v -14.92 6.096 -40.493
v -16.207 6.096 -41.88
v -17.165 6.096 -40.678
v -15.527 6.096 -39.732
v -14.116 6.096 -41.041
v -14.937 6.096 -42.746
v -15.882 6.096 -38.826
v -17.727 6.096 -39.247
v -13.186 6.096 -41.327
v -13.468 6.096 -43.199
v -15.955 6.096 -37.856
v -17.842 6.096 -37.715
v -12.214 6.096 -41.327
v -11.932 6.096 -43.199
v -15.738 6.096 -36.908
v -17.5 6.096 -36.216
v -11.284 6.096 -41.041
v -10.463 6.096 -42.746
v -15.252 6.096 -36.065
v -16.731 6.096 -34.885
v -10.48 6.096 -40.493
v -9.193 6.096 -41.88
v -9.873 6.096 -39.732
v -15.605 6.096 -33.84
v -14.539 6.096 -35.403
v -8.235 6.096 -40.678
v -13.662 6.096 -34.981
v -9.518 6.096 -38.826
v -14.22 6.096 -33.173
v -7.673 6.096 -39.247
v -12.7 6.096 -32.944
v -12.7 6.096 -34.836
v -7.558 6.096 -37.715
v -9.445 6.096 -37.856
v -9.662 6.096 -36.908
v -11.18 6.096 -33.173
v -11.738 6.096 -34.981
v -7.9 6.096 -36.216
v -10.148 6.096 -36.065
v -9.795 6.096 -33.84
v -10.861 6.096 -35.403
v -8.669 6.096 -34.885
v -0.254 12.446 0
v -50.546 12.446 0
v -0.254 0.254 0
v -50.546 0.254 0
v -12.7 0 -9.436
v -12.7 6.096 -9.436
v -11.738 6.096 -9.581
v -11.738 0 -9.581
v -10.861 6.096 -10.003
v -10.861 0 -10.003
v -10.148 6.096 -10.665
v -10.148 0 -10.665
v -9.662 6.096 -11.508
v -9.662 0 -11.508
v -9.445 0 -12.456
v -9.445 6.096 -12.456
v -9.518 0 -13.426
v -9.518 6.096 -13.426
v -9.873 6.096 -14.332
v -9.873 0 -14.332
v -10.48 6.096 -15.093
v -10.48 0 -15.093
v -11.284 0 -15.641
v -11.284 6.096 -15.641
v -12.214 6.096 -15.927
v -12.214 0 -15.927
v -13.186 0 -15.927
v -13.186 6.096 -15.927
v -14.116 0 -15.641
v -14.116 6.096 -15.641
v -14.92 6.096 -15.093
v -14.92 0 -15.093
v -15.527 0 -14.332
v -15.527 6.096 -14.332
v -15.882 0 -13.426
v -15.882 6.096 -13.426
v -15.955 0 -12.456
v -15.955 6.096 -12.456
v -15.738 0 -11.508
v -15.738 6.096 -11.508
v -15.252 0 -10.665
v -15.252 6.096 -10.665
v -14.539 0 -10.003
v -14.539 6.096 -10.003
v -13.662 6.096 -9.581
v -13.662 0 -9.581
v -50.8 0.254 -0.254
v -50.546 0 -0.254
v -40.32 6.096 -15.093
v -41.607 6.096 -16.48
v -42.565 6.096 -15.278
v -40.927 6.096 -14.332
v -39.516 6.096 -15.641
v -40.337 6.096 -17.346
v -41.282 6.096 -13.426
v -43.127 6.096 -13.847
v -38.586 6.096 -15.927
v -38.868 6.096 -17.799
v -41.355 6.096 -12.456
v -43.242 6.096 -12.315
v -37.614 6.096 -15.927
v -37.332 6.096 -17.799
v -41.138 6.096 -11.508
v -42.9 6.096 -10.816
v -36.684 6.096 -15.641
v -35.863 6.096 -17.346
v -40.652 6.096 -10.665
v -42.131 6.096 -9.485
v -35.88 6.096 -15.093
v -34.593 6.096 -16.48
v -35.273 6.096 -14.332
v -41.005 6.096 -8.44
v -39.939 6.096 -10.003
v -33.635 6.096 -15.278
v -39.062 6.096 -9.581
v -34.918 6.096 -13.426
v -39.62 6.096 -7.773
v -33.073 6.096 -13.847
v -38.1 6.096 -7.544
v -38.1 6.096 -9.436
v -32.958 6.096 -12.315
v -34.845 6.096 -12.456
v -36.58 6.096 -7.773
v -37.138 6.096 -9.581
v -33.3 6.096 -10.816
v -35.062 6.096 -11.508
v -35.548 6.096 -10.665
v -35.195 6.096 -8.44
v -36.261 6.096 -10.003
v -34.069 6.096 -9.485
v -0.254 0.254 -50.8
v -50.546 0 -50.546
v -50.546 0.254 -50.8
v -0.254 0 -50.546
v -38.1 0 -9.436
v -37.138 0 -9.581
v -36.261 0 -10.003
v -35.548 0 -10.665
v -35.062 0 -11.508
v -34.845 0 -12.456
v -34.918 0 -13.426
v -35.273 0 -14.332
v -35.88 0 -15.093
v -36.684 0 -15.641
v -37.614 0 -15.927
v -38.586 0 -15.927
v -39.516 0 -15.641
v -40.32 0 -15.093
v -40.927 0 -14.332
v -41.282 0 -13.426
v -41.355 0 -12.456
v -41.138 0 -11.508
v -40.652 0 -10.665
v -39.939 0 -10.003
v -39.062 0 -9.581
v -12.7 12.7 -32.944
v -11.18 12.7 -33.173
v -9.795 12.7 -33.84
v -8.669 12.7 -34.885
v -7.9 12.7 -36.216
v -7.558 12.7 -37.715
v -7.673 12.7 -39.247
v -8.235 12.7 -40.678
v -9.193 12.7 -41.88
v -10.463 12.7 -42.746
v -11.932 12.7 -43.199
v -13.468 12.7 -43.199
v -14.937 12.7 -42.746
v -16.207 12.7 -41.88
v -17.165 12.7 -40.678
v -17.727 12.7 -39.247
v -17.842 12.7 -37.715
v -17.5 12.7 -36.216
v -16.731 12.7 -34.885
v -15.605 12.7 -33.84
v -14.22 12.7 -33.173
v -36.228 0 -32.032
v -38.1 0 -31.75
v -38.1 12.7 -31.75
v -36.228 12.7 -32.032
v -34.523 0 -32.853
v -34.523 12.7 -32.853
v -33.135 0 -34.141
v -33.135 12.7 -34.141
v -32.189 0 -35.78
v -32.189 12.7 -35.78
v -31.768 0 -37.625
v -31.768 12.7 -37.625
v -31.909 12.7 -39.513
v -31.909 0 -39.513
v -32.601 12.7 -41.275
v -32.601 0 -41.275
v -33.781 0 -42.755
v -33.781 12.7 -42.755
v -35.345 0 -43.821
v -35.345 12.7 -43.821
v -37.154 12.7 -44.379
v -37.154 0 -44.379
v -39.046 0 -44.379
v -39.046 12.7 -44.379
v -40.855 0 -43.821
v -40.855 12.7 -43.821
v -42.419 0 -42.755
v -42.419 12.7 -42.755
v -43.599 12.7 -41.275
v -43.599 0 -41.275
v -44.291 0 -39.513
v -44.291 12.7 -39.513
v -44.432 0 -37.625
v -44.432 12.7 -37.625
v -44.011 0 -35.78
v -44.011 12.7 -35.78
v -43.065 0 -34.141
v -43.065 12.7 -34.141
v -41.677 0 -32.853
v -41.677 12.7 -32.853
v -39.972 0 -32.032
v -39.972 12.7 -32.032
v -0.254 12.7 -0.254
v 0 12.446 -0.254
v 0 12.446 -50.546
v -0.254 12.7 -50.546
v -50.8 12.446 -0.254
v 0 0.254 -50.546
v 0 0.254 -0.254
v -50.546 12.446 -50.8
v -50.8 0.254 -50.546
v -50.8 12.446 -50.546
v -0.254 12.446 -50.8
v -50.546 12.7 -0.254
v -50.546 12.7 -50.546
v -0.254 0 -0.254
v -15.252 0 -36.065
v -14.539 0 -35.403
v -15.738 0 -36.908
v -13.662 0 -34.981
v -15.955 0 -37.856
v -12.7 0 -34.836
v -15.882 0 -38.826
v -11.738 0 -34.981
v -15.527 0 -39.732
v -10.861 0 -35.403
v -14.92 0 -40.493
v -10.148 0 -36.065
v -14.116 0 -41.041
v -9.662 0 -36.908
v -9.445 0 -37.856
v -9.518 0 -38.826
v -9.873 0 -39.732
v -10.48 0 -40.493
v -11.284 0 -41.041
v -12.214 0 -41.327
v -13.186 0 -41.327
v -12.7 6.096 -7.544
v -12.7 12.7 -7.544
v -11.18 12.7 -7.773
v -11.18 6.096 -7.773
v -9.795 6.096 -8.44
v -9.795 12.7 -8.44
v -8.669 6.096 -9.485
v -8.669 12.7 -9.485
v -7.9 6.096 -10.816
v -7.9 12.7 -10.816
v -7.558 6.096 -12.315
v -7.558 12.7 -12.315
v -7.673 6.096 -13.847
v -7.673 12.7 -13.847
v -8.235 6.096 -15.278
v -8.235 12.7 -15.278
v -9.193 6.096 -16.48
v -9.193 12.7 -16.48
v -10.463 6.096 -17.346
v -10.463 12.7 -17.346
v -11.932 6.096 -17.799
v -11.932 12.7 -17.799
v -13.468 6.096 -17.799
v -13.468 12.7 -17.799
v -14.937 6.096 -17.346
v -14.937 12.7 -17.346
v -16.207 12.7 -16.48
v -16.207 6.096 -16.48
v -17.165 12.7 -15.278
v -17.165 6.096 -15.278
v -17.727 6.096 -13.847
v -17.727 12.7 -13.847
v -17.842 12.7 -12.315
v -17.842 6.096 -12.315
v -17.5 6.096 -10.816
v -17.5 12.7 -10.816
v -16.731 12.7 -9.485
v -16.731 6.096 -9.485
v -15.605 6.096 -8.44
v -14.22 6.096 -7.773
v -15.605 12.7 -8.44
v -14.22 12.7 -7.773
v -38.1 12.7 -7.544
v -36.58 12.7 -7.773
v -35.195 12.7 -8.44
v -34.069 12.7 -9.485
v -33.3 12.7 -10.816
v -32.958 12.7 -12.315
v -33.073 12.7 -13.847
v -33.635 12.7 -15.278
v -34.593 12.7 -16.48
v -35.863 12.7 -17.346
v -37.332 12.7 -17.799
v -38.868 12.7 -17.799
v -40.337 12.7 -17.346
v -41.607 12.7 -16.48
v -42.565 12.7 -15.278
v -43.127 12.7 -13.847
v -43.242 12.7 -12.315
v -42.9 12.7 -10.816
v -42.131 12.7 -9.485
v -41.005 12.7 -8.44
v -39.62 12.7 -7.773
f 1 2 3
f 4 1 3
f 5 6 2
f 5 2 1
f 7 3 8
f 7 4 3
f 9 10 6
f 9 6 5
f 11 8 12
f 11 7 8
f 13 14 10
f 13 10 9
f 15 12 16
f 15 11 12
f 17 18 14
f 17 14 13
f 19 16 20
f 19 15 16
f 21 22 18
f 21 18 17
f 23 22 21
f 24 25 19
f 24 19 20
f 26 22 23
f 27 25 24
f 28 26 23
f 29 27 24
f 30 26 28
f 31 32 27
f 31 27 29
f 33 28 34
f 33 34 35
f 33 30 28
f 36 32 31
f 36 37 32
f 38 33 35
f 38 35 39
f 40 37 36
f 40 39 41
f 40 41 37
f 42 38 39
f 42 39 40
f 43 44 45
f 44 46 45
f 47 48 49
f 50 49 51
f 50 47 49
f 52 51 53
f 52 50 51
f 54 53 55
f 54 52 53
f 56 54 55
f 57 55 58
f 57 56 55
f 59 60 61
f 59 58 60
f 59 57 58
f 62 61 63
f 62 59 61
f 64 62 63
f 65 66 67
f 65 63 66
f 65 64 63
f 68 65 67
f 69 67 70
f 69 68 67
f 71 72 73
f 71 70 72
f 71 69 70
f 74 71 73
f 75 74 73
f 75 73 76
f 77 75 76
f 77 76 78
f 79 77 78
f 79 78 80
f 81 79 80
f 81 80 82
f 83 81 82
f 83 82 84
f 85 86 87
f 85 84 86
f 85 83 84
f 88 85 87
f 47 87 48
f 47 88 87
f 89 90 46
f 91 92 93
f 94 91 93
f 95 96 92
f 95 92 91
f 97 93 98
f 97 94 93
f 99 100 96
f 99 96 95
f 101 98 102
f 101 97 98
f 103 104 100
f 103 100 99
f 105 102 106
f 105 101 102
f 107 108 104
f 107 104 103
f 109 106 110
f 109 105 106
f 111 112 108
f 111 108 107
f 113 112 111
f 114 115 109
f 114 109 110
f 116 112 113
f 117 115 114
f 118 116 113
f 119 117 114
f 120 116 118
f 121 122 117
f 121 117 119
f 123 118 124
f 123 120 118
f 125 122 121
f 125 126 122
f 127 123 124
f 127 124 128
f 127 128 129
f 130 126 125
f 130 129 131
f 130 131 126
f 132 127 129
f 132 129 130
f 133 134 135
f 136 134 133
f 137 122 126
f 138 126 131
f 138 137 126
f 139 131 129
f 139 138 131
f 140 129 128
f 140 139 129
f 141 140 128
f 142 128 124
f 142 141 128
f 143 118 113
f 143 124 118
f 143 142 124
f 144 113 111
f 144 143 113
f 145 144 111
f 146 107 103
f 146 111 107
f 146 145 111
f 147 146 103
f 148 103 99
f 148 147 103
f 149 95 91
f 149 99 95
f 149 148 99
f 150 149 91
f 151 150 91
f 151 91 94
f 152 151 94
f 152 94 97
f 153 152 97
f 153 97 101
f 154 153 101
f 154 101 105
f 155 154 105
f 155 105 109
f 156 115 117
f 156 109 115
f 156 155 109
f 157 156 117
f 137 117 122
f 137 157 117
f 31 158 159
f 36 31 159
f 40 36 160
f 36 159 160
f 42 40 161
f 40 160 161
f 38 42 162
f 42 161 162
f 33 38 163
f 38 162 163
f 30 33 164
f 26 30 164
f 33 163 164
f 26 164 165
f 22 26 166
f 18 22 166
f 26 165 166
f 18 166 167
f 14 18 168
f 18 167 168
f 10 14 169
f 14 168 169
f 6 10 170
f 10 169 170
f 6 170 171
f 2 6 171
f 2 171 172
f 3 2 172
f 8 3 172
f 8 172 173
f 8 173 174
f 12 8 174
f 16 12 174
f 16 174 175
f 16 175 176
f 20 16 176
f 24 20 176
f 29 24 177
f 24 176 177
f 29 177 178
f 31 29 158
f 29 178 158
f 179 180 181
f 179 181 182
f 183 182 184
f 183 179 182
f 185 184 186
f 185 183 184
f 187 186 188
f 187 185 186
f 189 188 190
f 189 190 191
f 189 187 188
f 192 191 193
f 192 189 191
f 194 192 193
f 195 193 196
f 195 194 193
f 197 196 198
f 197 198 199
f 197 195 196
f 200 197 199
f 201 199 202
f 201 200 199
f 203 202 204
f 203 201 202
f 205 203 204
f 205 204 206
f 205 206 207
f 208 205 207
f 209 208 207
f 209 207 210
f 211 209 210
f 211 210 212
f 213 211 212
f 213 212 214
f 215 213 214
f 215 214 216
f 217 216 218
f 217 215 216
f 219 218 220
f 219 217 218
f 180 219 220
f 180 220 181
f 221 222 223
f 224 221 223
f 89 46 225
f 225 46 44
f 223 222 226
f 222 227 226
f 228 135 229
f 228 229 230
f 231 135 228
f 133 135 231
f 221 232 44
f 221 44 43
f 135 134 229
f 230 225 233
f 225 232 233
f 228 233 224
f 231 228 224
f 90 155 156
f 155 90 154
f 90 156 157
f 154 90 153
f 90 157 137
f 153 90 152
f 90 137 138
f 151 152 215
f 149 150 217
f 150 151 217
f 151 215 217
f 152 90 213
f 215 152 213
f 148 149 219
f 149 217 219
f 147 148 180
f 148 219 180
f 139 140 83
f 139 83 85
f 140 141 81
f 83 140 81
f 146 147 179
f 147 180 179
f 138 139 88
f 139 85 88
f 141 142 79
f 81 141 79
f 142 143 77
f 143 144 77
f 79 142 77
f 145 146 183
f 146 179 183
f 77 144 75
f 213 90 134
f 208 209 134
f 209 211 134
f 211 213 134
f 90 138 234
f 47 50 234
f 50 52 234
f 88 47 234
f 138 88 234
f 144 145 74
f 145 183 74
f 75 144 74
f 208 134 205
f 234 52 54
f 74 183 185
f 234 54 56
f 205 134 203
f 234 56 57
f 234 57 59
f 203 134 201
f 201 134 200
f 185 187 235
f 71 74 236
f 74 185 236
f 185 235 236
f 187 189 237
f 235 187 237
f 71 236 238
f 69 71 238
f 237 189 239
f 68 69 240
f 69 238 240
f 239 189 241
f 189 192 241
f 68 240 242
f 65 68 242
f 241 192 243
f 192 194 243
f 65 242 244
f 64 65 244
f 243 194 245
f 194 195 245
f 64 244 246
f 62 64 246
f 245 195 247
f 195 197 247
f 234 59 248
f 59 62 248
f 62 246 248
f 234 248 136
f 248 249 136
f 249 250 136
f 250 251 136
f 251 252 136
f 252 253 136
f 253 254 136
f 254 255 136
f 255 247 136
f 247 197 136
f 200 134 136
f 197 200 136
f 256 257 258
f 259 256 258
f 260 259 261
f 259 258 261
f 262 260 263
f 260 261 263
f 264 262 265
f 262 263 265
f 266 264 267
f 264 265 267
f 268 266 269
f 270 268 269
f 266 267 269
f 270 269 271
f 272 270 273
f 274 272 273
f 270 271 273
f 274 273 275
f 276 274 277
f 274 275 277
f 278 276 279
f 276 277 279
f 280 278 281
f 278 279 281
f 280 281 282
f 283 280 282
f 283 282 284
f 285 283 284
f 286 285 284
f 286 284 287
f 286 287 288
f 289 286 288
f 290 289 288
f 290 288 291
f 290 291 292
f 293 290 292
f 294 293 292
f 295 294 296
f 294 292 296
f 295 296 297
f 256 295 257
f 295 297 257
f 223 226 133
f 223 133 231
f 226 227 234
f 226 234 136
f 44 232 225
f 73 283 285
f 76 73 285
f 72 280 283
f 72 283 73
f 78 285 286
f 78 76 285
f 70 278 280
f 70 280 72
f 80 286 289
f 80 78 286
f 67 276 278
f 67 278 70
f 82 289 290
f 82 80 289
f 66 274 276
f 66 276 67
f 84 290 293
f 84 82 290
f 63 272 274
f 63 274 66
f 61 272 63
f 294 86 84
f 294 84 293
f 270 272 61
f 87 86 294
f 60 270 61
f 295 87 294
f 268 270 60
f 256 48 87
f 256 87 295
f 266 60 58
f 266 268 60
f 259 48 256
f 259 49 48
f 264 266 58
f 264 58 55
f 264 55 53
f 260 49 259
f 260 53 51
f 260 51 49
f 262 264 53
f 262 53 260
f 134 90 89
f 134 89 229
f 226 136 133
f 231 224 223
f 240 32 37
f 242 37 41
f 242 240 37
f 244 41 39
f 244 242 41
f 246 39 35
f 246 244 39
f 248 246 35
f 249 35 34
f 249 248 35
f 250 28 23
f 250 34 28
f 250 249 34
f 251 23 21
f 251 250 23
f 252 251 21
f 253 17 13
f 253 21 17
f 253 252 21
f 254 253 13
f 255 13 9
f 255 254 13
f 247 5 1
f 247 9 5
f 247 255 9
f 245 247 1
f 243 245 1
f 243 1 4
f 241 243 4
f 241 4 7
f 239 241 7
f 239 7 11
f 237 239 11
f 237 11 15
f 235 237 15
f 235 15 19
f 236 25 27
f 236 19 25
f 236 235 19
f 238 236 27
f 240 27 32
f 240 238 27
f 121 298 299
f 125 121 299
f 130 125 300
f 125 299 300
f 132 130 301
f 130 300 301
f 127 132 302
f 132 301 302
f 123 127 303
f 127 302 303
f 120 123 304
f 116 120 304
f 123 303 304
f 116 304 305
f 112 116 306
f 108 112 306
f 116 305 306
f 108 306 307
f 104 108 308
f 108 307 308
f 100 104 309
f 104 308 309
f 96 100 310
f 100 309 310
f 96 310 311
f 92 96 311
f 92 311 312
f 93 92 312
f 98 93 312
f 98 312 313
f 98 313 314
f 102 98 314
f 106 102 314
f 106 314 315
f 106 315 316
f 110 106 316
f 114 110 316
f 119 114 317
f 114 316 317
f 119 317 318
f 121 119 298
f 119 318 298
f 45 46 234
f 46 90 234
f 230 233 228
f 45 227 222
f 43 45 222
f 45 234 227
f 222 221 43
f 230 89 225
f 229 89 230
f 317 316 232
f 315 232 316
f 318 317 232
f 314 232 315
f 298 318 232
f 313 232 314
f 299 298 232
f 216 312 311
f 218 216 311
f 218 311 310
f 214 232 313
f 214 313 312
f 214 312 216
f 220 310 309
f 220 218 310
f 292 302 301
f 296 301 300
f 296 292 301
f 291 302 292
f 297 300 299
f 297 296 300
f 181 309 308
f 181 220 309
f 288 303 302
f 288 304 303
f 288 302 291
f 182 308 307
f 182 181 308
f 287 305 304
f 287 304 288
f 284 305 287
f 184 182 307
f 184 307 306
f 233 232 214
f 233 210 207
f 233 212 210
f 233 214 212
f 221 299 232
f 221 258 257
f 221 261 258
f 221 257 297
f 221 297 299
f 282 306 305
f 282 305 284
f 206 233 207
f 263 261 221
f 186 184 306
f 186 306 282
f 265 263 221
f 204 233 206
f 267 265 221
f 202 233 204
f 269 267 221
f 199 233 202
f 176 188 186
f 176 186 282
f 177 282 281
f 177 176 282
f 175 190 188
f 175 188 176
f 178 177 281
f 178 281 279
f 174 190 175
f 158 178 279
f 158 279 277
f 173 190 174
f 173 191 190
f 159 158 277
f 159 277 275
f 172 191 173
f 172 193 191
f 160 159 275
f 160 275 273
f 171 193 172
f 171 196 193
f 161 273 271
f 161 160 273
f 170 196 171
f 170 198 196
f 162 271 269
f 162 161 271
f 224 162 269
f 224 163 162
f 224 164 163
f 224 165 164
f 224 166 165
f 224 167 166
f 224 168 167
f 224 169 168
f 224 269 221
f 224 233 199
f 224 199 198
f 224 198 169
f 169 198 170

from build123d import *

# Parameters (mm, degrees)
SKETCH1_W          = 50.8
SKETCH1_H          = 50.8
SKETCH1_R          = 6.35
SKETCH1_R_2        = 3.2639
EXTRUDE1_DEPTH     = 12.7
SKETCH2_R          = 5.1562
CUT_EXTRUDE1_DEPTH = 6.604
CHAMFER1_SIZE      = 0.254


with BuildPart() as part:
    # Sketch1 → Extrude1 (new body)
    with BuildSketch(Plane(origin=(0, 0, 0), x_dir=(1, 0, 0), z_dir=(0, 1, 0))):
        with Locations((-25.4, 25.4)):
            Rectangle(SKETCH1_W, SKETCH1_H)
        with Locations(Location((-38.1, 38.1, 0), (0, 0, 270))):
            Circle(SKETCH1_R, mode=Mode.SUBTRACT)
        with Locations(Location((-12.7, 38.1, 0), (0, 0, 270))):
            Circle(SKETCH1_R_2, mode=Mode.SUBTRACT)
        with Locations(Location((-12.7, 12.7, 0), (0, 0, 270))):
            Circle(SKETCH1_R_2, mode=Mode.SUBTRACT)
        with Locations(Location((-38.1, 12.7, 0), (0, 0, 270))):
            Circle(SKETCH1_R_2, mode=Mode.SUBTRACT)
    extrude(amount=EXTRUDE1_DEPTH)

    # Sketch2 → Cut-Extrude1 (cut)
    with BuildSketch(Plane(origin=(0, 12.7, 0), x_dir=(1, 0, 0), z_dir=(0, 1, 0))):
        with Locations(Location((-12.7, 38.1, 0), (0, 0, 270))):
            Circle(SKETCH2_R)
        with Locations(Location((-12.7, 12.7, 0), (0, 0, 270))):
            Circle(SKETCH2_R)
        with Locations(Location((-38.1, 12.7, 0), (0, 0, 270))):
            Circle(SKETCH2_R)
    extrude(amount=-CUT_EXTRUDE1_DEPTH, mode=Mode.SUBTRACT)

    # Chamfer1
    chamfer1_edges = [part.edges().sort_by_distance(p)[0] for p in [
        (-50.8, 12.7, -25.4),
        (-25.4, 12.7, 0),
        (0, 12.7, -25.4),
        (-25.4, 0, 0),
        (-50.8, 0, -25.4),
        (-25.4, 0, -50.8),
        (0, 0, -25.4),
        (-25.4, 12.7, -50.8),
        (0, 6.35, 0),
        (-50.8, 6.35, 0),
        (-50.8, 6.35, -50.8),
        (0, 6.35, -50.8),
    ]]
    chamfer(chamfer1_edges, length=CHAMFER1_SIZE)


solid = part.part
